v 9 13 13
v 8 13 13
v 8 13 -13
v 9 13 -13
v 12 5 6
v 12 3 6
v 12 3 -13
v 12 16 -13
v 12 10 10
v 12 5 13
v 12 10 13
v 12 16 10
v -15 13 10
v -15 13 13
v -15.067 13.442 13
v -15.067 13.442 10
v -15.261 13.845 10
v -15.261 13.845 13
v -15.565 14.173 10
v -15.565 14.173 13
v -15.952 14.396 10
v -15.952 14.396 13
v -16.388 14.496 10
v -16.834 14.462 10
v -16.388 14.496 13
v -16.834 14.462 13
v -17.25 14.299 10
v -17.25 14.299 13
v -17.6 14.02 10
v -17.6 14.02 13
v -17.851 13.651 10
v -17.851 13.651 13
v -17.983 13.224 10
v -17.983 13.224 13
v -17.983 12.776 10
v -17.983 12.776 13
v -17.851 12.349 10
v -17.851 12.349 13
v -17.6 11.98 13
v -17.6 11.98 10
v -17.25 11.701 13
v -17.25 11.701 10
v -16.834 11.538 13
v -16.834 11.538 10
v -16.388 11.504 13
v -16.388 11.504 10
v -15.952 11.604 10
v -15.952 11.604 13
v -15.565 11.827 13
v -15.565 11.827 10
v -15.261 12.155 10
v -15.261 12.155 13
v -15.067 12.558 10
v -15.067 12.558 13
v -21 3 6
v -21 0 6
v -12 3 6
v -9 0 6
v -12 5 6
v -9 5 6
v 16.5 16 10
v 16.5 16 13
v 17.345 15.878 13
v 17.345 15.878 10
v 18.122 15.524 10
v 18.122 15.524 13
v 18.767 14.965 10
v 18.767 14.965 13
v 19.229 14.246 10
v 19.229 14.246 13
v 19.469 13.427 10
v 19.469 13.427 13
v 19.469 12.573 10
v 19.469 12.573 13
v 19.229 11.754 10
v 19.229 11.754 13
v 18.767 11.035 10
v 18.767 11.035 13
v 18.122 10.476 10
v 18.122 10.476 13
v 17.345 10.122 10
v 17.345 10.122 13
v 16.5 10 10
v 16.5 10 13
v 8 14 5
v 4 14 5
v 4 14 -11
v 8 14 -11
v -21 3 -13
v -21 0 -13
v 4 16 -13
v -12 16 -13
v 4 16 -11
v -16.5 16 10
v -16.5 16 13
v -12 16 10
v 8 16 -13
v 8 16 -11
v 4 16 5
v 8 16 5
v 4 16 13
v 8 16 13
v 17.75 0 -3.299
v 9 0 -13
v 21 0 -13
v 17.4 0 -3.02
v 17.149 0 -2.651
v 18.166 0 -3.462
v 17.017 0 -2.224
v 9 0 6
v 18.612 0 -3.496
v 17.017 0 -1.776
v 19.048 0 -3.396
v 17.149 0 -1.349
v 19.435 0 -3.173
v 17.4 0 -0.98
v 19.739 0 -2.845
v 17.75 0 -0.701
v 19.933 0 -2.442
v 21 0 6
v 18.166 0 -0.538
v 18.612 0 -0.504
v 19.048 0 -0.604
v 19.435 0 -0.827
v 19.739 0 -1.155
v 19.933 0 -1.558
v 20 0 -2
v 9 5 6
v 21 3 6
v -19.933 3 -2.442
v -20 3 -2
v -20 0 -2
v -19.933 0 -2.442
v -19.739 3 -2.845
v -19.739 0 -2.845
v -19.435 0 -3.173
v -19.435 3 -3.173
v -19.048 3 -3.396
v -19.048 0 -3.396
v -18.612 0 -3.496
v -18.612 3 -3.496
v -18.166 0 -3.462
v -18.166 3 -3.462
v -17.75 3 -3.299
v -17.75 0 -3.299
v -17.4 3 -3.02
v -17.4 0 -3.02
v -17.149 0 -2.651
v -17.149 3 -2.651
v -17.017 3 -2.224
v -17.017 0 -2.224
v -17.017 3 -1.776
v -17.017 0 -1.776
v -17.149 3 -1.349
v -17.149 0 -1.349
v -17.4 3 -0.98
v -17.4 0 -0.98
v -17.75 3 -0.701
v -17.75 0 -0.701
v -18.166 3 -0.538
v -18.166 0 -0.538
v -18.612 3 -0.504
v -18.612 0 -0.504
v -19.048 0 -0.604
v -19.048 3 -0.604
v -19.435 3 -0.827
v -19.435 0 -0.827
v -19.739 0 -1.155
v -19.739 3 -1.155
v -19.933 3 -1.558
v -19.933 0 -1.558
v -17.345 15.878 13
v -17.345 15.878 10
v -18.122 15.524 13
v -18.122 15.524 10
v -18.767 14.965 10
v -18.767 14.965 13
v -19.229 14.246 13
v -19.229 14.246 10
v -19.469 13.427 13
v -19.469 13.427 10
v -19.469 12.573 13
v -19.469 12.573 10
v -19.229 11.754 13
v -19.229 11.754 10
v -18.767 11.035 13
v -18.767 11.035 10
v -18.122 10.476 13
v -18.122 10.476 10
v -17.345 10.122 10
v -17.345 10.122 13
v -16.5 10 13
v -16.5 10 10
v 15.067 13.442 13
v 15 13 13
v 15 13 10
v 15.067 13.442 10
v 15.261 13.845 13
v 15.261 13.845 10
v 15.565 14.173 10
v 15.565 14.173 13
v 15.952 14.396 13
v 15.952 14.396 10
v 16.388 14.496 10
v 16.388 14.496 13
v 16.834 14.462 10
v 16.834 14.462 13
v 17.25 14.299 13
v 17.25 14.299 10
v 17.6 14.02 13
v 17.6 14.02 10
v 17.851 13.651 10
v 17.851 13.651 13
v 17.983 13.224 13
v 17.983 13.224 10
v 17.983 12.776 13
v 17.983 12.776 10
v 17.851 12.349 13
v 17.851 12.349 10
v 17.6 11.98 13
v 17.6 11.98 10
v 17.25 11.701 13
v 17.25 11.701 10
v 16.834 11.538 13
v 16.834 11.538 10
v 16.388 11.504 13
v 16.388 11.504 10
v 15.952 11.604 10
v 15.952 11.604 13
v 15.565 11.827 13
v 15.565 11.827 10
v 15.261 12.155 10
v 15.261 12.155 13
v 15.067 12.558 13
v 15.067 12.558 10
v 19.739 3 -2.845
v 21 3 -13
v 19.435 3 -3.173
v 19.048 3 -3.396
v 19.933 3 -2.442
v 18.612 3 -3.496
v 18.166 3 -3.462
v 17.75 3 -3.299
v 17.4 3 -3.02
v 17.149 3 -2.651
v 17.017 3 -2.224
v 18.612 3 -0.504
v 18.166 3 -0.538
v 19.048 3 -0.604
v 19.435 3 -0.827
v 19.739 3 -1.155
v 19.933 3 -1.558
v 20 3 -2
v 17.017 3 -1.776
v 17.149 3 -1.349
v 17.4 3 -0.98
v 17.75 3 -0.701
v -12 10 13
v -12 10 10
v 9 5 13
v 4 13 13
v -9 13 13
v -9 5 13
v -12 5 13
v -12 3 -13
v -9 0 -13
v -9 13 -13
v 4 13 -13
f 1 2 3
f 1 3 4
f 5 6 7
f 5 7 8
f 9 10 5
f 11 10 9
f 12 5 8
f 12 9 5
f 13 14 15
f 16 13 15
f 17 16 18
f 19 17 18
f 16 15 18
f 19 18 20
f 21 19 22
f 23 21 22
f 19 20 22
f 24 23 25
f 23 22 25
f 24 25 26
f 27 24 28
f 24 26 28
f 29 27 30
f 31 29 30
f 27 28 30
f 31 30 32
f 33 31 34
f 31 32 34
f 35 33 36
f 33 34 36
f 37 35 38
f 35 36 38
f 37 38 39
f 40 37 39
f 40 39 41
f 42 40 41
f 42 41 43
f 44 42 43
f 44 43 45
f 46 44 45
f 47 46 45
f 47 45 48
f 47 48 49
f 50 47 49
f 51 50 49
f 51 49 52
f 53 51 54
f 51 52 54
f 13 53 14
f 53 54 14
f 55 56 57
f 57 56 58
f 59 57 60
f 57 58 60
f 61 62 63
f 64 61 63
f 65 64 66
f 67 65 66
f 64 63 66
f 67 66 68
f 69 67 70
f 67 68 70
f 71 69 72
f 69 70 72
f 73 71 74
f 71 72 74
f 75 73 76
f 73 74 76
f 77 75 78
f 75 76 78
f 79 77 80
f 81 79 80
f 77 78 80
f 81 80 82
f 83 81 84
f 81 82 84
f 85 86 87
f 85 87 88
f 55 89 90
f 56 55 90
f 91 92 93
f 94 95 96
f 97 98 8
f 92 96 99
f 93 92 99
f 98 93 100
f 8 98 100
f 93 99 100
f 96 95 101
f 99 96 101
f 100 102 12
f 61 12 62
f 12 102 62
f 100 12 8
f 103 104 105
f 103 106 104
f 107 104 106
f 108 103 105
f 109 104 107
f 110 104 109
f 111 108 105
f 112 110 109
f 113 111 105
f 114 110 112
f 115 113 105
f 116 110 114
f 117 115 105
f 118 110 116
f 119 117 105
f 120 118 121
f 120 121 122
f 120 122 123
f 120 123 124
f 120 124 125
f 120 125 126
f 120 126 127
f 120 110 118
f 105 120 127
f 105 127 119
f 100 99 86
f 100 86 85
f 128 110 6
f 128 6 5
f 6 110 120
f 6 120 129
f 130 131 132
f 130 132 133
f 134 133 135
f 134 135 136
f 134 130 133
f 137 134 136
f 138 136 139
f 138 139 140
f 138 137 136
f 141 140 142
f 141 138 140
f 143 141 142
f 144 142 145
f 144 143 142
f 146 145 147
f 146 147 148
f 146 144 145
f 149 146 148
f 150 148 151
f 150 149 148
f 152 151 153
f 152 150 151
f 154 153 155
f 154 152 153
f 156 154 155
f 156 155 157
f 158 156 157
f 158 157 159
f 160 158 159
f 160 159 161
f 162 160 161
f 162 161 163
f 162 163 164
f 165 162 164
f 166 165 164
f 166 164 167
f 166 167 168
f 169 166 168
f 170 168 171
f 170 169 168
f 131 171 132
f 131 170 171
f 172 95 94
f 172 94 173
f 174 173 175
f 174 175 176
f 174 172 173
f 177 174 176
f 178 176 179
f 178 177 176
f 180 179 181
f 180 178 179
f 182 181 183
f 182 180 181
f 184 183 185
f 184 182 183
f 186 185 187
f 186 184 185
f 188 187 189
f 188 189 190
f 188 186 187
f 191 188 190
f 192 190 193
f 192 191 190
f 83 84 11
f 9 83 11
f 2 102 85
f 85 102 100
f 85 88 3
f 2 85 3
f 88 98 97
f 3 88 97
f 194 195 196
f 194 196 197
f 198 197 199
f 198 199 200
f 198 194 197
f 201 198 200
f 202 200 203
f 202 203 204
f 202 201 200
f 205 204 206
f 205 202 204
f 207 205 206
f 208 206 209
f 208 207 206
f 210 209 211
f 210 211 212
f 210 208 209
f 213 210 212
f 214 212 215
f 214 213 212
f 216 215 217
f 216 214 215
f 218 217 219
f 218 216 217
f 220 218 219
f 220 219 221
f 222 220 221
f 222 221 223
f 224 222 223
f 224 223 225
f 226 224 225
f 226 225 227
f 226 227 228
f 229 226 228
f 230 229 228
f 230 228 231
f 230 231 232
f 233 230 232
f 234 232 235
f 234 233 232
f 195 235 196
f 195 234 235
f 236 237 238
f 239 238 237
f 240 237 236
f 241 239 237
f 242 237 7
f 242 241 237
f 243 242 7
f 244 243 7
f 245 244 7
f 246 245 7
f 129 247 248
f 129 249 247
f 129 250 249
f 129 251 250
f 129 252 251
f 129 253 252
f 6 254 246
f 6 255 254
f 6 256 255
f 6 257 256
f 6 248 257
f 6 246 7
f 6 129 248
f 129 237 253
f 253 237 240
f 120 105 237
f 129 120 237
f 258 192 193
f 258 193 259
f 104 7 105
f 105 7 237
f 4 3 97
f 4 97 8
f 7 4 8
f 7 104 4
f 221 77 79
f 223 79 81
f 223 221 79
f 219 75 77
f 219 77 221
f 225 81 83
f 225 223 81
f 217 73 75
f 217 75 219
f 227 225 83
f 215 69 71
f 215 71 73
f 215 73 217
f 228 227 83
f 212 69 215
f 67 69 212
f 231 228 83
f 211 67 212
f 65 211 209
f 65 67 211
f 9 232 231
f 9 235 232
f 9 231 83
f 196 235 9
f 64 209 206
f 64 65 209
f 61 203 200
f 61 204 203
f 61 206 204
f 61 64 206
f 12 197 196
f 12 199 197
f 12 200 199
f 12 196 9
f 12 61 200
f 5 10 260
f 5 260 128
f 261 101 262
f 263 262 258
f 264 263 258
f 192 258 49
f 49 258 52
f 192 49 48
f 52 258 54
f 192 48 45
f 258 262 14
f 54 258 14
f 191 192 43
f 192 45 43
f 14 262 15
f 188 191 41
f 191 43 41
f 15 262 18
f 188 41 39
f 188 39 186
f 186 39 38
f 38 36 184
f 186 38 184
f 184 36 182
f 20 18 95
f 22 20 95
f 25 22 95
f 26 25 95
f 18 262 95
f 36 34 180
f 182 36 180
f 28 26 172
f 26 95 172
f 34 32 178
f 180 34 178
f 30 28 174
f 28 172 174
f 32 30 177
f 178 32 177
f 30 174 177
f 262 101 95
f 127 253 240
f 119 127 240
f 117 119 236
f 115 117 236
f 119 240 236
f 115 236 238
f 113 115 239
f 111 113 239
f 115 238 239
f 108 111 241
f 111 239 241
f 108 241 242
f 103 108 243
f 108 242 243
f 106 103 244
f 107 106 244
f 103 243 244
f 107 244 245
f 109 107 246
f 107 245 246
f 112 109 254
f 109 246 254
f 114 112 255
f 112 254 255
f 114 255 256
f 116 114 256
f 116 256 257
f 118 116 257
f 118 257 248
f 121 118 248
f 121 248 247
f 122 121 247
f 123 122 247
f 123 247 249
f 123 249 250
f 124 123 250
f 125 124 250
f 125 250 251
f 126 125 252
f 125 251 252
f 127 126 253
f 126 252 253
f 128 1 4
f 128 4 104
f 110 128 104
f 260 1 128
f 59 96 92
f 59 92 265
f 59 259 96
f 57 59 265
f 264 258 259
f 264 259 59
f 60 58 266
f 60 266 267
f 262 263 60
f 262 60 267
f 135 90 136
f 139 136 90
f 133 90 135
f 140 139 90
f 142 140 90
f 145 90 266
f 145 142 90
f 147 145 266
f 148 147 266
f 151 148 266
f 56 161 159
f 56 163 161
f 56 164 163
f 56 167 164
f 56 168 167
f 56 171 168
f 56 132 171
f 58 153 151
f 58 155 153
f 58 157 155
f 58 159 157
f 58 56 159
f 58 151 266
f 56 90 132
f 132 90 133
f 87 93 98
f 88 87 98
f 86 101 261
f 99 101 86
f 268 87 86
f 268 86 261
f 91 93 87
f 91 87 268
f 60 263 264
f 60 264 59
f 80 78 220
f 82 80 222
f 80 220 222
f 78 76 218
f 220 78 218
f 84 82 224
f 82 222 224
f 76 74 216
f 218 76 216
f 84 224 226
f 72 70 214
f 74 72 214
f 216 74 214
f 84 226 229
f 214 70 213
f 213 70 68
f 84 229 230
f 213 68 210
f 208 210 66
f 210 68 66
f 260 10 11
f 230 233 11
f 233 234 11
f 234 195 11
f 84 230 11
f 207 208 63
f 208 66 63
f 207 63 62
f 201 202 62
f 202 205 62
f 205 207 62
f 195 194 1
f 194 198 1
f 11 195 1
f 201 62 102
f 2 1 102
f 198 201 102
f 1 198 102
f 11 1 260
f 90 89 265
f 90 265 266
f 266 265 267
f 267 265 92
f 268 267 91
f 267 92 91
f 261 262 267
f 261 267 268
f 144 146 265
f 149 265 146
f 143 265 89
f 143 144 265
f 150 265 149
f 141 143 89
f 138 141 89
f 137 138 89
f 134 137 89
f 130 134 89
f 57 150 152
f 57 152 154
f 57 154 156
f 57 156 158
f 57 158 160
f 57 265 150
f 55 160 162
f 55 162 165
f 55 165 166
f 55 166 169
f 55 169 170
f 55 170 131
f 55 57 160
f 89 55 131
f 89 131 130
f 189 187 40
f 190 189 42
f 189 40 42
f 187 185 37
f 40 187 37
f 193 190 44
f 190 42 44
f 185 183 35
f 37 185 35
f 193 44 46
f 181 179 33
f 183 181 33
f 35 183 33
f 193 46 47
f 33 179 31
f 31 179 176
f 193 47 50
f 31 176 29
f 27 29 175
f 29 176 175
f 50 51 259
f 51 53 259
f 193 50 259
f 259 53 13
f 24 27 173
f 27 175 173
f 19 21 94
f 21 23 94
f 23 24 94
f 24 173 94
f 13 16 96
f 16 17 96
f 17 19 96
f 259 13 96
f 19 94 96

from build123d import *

# Parameters (mm, degrees)
EXTRU_MINCE1_DEPTH      = 13
EXTRUSION1_DEPTH        = 3
ESQUISSE3_R             = 1.5
ENL_V_MAT_EXTRU_1_DEPTH = 3
ENL_V_MAT_EXTRU_2_REACH = 18
ESQUISSE4_W             = 4
ESQUISSE4_H             = 8
ESQUISSE4_H_2           = 2
ESQUISSE6_W             = 7
ESQUISSE6_H             = 5
ENL_V_MAT_EXTRU_4_DEPTH = 42
ESQUISSE7_R             = 1.5
ENL_V_MAT_EXTRU_5_DEPTH = 3
ESQUISSE8_W             = 4
ESQUISSE8_H             = 16
ENL_V_MAT_EXTRU_6_DEPTH = 1


with BuildPart() as part:
    # Esquisse1 → Extru.-Mince1 (new body, symmetric)
    with BuildSketch(Plane.XY):
        Polygon((-21, 0), (-9, 0), (-9, 13), (9, 13), (9, 0), (21, 0), (21, 3), (12, 3), (12, 16), (-12, 16), (-12, 3), (-21, 3), align=None)
    extrude(amount=EXTRU_MINCE1_DEPTH, both=True)

    # Esquisse2 → Extrusion1 (add)
    with BuildSketch(Plane.XY.offset(13)):
        with BuildLine():
            Line((-12, 16), (-16.5, 16))
            ThreePointArc((-16.5, 16), (-19.5, 13), (-16.5, 10))
            Line((-16.5, 10), (-12, 10))
            Line((-12, 10), (-12, 16))
        make_face()
    extrusion1 = extrude(amount=-EXTRUSION1_DEPTH)

    # Esquisse3 → Enlèv. mat.-Extru.1 (cut)
    with BuildSketch(Plane.XY.offset(13)):
        with Locations((-16.5, 13)):
            Circle(ESQUISSE3_R)
    enl_v_mat_extru_1 = extrude(amount=-ENL_V_MAT_EXTRU_1_DEPTH, mode=Mode.SUBTRACT)

    # Symétrie1: Extrusion1, Enlèv. mat.-Extru.1 across plane
    add(extrusion1.mirror(Plane(origin=(0, 0, 0), x_dir=(0, 0, 1), z_dir=(1, 0, 0))))
    add(enl_v_mat_extru_1.mirror(Plane(origin=(0, 0, 0), x_dir=(0, 0, 1), z_dir=(1, 0, 0))), mode=Mode.SUBTRACT)

    # Esquisse4 → Enlèv. mat.-Extru.2 (cut, up to next)
    with BuildSketch(Plane(origin=(0, 16, 0), x_dir=(1, 0, 0), z_dir=(0, 1, 0)), mode=Mode.PRIVATE) as enl_v_mat_extru_2_sk1:
        with Locations((6, -9)):
            Rectangle(ESQUISSE4_W, ESQUISSE4_H)
    enl_v_mat_extru_2_tool1 = extrude(enl_v_mat_extru_2_sk1.sketch, amount=-ENL_V_MAT_EXTRU_2_REACH, mode=Mode.PRIVATE) & part.part
    add(enl_v_mat_extru_2_tool1.solids().sort_by_distance((6, 16, 9))[0], mode=Mode.SUBTRACT)
    # Esquisse4 → Enlèv. mat.-Extru.2 (cut, up to next)
    with BuildSketch(Plane(origin=(0, 16, 0), x_dir=(1, 0, 0), z_dir=(0, 1, 0)), mode=Mode.PRIVATE) as enl_v_mat_extru_2_sk2:
        with Locations((6, 12)):
            Rectangle(ESQUISSE4_W, ESQUISSE4_H_2)
    enl_v_mat_extru_2_tool2 = extrude(enl_v_mat_extru_2_sk2.sketch, amount=-ENL_V_MAT_EXTRU_2_REACH, mode=Mode.PRIVATE) & part.part
    add(enl_v_mat_extru_2_tool2.solids().sort_by_distance((6, 16, -12))[0], mode=Mode.SUBTRACT)

    # Esquisse6 → Enlèv. mat.-Extru.4 (cut)
    with BuildSketch(Plane(origin=(21, 0, 0), x_dir=(0, 0, -1), z_dir=(1, 0, 0))):
        with Locations((-9.5, 2.5)):
            Rectangle(ESQUISSE6_W, ESQUISSE6_H)
    extrude(amount=-ENL_V_MAT_EXTRU_4_DEPTH, mode=Mode.SUBTRACT)

    # Esquisse7 → Enlèv. mat.-Extru.5 (cut)
    with BuildSketch(Plane(origin=(0, 3, 0), x_dir=(1, 0, 0), z_dir=(0, 1, 0))):
        with Locations((18.5, 2)):
            Circle(ESQUISSE7_R)
    enl_v_mat_extru_5 = extrude(amount=-ENL_V_MAT_EXTRU_5_DEPTH, mode=Mode.SUBTRACT)

    # Symétrie2: Enlèv. mat.-Extru.5 across plane
    add(enl_v_mat_extru_5.mirror(Plane(origin=(0, 0, 0), x_dir=(0, 0, 1), z_dir=(1, 0, 0))), mode=Mode.SUBTRACT)

    # Esquisse8 → Enlèv. mat.-Extru.6 (cut)
    with BuildSketch(Plane.XZ.offset(-13)):
        with Locations((6, -3)):
            Rectangle(ESQUISSE8_W, ESQUISSE8_H)
    extrude(amount=-ENL_V_MAT_EXTRU_6_DEPTH, mode=Mode.SUBTRACT)


solid = part.part
